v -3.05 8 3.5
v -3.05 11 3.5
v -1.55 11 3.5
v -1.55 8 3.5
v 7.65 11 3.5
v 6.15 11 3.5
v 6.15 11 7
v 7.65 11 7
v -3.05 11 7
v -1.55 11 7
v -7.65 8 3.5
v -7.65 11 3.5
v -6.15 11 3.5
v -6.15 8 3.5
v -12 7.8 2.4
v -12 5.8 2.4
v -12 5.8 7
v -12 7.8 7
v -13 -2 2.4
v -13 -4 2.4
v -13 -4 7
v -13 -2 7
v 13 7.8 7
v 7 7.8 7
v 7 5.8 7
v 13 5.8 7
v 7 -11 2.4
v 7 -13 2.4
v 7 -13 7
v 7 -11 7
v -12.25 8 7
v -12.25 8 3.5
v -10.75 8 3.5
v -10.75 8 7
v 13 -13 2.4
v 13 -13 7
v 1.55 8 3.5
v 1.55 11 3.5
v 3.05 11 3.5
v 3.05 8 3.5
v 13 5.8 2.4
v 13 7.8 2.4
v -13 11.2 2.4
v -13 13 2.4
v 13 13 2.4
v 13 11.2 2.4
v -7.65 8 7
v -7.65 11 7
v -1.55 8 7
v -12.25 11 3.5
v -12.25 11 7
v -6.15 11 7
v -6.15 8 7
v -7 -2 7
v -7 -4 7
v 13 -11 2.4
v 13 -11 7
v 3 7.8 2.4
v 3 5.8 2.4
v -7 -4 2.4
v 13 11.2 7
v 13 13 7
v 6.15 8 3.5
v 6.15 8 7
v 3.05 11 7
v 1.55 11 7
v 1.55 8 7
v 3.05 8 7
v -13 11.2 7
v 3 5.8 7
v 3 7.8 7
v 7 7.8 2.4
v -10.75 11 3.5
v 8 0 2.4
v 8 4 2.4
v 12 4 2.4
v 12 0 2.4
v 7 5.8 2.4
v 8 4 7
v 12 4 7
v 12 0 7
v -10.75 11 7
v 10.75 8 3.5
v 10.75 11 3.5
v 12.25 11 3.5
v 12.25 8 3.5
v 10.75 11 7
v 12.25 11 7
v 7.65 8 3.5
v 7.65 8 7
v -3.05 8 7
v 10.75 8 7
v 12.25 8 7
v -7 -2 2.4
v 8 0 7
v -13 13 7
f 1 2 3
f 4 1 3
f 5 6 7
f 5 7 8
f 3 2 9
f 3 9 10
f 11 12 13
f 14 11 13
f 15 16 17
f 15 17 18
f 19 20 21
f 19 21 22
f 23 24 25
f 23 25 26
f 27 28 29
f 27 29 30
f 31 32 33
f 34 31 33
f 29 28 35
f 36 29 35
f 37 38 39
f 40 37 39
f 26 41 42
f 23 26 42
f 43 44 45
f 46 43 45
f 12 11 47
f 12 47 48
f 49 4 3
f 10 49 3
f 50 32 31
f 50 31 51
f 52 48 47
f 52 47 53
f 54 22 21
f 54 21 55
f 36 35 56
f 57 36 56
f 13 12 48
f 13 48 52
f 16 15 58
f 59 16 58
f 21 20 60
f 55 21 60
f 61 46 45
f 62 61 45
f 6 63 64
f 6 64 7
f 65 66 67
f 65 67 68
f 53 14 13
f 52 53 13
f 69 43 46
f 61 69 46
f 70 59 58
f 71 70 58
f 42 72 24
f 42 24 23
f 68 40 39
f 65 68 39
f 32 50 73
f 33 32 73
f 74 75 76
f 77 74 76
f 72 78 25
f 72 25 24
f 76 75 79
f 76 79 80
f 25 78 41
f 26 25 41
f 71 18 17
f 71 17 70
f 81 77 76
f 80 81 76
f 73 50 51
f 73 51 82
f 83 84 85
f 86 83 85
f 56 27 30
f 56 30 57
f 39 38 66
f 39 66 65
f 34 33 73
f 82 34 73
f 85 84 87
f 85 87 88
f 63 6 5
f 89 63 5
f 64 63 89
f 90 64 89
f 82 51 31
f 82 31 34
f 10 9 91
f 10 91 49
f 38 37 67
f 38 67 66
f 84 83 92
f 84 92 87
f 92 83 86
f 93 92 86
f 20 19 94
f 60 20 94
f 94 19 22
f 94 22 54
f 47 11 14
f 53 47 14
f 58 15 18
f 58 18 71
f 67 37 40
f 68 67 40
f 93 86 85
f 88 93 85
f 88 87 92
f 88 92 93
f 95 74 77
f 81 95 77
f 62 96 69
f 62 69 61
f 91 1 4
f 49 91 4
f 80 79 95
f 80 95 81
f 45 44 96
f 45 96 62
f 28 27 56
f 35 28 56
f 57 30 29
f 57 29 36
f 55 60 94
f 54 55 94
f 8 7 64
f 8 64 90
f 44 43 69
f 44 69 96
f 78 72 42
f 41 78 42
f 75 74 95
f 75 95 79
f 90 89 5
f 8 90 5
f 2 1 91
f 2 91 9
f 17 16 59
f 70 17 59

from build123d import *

# Parameters (mm, degrees)
BOX010_W     = 6
BOX010_H     = 2
BOX010_DEPTH = 4.6
BOX008_W     = 4
BOX008_H     = 4
BOX008_DEPTH = 4.6
BOX007_W     = 26
BOX007_H     = 1.8
BOX007_DEPTH = 4.6
BOX009_W     = 6
BOX009_H     = 2
BOX009_DEPTH = 4.6
BOX016_W     = 15
BOX016_H     = 2
BOX016_DEPTH = 4.6
BOX017_W     = 1.5
BOX017_H     = 3
BOX017_DEPTH = 3.5
BOX018_W     = 1.5
BOX018_H     = 3
BOX018_DEPTH = 3.5
BOX019_W     = 1.5
BOX019_H     = 3
BOX019_DEPTH = 3.5
BOX020_W     = 1.5
BOX020_H     = 3
BOX020_DEPTH = 3.5
BOX021_W     = 1.5
BOX021_H     = 3
BOX021_DEPTH = 3.5
BOX022_W     = 1.5
BOX022_H     = 3
BOX022_DEPTH = 3.5
BOX011_W     = 6
BOX011_H     = 2
BOX011_DEPTH = 4.6


with BuildPart() as cubedestek4:
    # Box010 → Box010 (new body)
    with BuildSketch(Plane(origin=(7, 5.8, 2.4), x_dir=(1, 0, 0), z_dir=(0, 0, 1))):
        with Locations((3, 1)):
            Rectangle(BOX010_W, BOX010_H)
    extrude(amount=BOX010_DEPTH)


with BuildPart() as cubedestek2:
    # Box008 → Box008 (new body)
    with BuildSketch(Plane(origin=(8, 0, 2.4), x_dir=(1, 0, 0), z_dir=(0, 0, 1))):
        with Locations((2, 2)):
            Rectangle(BOX008_W, BOX008_H)
    extrude(amount=BOX008_DEPTH)


with BuildPart() as cubedestek:
    # Box007 → Box007 (new body)
    with BuildSketch(Plane(origin=(-13, 11.2, 2.4), x_dir=(1, 0, 0), z_dir=(0, 0, 1))):
        with Locations((13, 0.9)):
            Rectangle(BOX007_W, BOX007_H)
    extrude(amount=BOX007_DEPTH)


with BuildPart() as cubedestek3:
    # Box009 → Box009 (new body)
    with BuildSketch(Plane(origin=(-13, -4, 2.4), x_dir=(1, 0, 0), z_dir=(0, 0, 1))):
        with Locations((3, 1)):
            Rectangle(BOX009_W, BOX009_H)
    extrude(amount=BOX009_DEPTH)


with BuildPart() as cubedestek006:
    # Box016 → Box016 (new body)
    with BuildSketch(Plane(origin=(-12, 5.8, 2.4), x_dir=(1, 0, 0), z_dir=(0, 0, 1))):
        with Locations((7.5, 1)):
            Rectangle(BOX016_W, BOX016_H)
    extrude(amount=BOX016_DEPTH)


with BuildPart() as cubedestek007:
    # Box017 → Box017 (new body)
    with BuildSketch(Plane(origin=(1.55, 8, 3.5), x_dir=(1, 0, 0), z_dir=(0, 0, 1))):
        with Locations((0.75, 1.5)):
            Rectangle(BOX017_W, BOX017_H)
    extrude(amount=BOX017_DEPTH)


with BuildPart() as cubedestek008:
    # Box018 → Box018 (new body)
    with BuildSketch(Plane(origin=(6.15, 8, 3.5), x_dir=(1, 0, 0), z_dir=(0, 0, 1))):
        with Locations((0.75, 1.5)):
            Rectangle(BOX018_W, BOX018_H)
    extrude(amount=BOX018_DEPTH)


with BuildPart() as cubedestek009:
    # Box019 → Box019 (new body)
    with BuildSketch(Plane(origin=(-3.05, 8, 3.5), x_dir=(1, 0, 0), z_dir=(0, 0, 1))):
        with Locations((0.75, 1.5)):
            Rectangle(BOX019_W, BOX019_H)
    extrude(amount=BOX019_DEPTH)


with BuildPart() as cubedestek010:
    # Box020 → Box020 (new body)
    with BuildSketch(Plane(origin=(-7.65, 8, 3.5), x_dir=(1, 0, 0), z_dir=(0, 0, 1))):
        with Locations((0.75, 1.5)):
            Rectangle(BOX020_W, BOX020_H)
    extrude(amount=BOX020_DEPTH)


with BuildPart() as cubedestek011:
    # Box021 → Box021 (new body)
    with BuildSketch(Plane(origin=(-12.25, 8, 3.5), x_dir=(1, 0, 0), z_dir=(0, 0, 1))):
        with Locations((0.75, 1.5)):
            Rectangle(BOX021_W, BOX021_H)
    extrude(amount=BOX021_DEPTH)


with BuildPart() as cubedestek012:
    # Box022 → Box022 (new body)
    with BuildSketch(Plane(origin=(10.75, 8, 3.5), x_dir=(1, 0, 0), z_dir=(0, 0, 1))):
        with Locations((0.75, 1.5)):
            Rectangle(BOX022_W, BOX022_H)
    extrude(amount=BOX022_DEPTH)


with BuildPart() as fusion002:
    # Box011 → Box011 (new body)
    with BuildSketch(Plane(origin=(7, -13, 2.4), x_dir=(1, 0, 0), z_dir=(0, 0, 1))):
        with Locations((3, 1)):
            Rectangle(BOX011_W, BOX011_H)
    extrude(amount=BOX011_DEPTH)

    # Fusion002: union CubeDestek4, CubeDestek2, CubeDestek, CubeDestek3, CubeDestek006, CubeDestek007, CubeDestek008, CubeDestek009, CubeDestek010, CubeDestek011, CubeDestek012
    add(cubedestek4.part)
    add(cubedestek2.part)
    add(cubedestek.part)
    add(cubedestek3.part)
    add(cubedestek006.part)
    add(cubedestek007.part)
    add(cubedestek008.part)
    add(cubedestek009.part)
    add(cubedestek010.part)
    add(cubedestek011.part)
    add(cubedestek012.part)


solid = fusion002.part
